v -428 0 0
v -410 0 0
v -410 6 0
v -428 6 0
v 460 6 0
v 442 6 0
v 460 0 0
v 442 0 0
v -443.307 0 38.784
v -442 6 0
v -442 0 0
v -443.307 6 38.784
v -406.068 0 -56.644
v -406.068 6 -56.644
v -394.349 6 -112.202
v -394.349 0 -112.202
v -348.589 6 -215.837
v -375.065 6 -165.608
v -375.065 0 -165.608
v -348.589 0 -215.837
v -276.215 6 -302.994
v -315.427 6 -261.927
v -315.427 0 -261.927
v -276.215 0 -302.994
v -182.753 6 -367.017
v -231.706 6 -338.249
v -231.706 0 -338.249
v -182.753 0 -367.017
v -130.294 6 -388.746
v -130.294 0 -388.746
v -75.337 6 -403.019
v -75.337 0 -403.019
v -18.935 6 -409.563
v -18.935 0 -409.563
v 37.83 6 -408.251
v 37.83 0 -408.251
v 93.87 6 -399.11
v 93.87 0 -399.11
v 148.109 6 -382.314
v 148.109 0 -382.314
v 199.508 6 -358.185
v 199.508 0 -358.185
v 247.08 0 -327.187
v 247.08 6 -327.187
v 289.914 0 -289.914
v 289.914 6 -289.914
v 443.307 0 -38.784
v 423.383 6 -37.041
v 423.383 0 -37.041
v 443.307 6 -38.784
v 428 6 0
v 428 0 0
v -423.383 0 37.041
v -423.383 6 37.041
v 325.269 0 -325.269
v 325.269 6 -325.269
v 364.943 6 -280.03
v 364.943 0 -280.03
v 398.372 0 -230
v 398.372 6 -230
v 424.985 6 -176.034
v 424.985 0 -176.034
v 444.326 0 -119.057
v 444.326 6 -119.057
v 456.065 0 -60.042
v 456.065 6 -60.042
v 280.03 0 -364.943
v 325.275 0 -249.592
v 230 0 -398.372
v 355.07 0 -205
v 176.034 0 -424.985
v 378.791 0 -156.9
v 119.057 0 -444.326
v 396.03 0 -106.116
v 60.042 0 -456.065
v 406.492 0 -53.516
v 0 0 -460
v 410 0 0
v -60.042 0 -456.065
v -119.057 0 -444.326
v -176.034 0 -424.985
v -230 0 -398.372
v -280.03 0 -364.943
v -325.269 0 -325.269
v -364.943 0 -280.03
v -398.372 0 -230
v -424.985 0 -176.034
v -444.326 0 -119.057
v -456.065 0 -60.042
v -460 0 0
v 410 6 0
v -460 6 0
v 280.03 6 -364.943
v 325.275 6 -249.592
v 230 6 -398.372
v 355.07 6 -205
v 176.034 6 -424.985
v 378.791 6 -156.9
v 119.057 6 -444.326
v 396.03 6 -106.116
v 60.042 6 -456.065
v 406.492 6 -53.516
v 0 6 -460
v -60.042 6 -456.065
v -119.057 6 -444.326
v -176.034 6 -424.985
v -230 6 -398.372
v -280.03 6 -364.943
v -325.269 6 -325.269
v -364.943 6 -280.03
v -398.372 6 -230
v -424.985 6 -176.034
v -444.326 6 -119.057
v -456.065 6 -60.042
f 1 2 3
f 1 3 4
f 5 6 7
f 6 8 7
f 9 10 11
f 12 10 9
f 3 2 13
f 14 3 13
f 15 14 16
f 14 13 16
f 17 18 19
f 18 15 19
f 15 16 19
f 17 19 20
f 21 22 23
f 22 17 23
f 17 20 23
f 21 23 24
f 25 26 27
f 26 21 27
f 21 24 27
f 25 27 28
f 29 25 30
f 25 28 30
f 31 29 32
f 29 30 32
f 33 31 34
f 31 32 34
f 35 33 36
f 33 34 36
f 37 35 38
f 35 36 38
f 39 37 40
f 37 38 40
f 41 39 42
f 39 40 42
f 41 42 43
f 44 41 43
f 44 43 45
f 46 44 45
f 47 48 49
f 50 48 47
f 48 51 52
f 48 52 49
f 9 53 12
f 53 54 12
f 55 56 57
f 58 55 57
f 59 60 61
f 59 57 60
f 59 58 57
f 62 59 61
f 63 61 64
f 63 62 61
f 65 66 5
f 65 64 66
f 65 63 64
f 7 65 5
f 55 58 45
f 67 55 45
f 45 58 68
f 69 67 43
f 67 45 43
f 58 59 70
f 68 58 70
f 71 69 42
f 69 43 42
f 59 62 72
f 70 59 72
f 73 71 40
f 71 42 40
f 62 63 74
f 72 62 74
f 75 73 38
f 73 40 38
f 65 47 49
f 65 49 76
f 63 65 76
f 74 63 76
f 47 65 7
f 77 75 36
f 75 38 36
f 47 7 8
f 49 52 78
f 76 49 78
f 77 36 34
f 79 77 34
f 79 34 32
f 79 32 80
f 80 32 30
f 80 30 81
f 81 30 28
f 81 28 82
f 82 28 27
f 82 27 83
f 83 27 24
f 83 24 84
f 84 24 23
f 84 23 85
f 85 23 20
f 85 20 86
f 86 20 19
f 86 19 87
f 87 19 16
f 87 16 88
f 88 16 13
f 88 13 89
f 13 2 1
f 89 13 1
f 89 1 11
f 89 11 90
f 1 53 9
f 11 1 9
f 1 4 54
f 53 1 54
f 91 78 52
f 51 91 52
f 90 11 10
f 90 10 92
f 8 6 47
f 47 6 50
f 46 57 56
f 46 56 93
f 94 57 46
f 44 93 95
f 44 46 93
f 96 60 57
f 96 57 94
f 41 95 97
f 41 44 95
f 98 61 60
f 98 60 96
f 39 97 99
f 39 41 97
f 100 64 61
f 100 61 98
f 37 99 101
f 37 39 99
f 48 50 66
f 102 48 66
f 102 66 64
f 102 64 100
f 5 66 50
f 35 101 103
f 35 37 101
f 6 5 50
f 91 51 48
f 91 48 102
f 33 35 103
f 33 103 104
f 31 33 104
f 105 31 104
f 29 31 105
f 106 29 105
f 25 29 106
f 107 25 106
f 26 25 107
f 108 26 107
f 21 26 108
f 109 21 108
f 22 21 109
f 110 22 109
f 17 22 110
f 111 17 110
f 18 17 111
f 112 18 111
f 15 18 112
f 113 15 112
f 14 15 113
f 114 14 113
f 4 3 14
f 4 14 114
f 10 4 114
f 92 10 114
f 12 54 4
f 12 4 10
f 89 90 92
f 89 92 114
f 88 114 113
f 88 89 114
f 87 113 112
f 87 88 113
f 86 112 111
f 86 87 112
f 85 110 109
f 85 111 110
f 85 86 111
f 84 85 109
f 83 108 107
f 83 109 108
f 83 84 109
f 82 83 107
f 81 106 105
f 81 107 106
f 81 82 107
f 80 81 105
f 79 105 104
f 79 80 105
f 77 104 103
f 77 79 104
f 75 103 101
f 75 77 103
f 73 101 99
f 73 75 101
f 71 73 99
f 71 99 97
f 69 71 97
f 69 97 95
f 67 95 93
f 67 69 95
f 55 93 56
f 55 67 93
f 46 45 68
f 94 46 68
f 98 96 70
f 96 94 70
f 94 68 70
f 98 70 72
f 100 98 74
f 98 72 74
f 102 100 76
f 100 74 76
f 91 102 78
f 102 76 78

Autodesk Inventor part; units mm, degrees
ref_plane "YZ Plane" through (0, 0, 0) normal (1, 0, 0) x (0, 1, 0)
ref_plane "XZ Plane" through (0, 0, 0) normal (0, 1, 0) x (-1, 0, 0)
ref_plane "XY Plane" through (0, 0, 0) normal (0, 0, 1) x (1, 0, 0)
sketch "Esboço1" plane through (0, 0, 0) normal (0, 1, 0) x (-1, 0, 0)
  arc A0 (-410, 0) -> (-289.9138, -289.9138) centre (0, 0) ccw
  arc A1 (-460, 0) -> (-325.2691, -325.2691) centre (0, 0) ccw
  circle A2 centre (0, 0) radius 460
  circle A3 centre (0, 0) radius 410
  line L0 (0, 0) -> (576.9105, 0)
  line L1 (0, 0) -> (-1224.3013, 0) construction
  line L2 (-410, 0) -> (-460, 0)
  point P0 (-460, 0)
  point P1 (-325.2691, -325.2691)
  point P2 (-289.9138, -289.9138)
  point P3 (-325.2691, -325.2691)
  point P4 (460, 0)
  point P5 (410, 0)
  point P6 (-289.9138, -289.9138)
  dimension "d27" = 820
  dimension "d28" = 920
  dimension "d87" = 180
extrude "Extrusão1" add sketch "Esboço1" along normal blind 6 contours A0 A3 L0 A2 A1 L2
sketch "Esboço6" plane through (0, 6, 0) normal (0, 1, 0) x (1, 0, 0)
  arc A0 (460, 0) -> (-460, 0) centre (0, 0) ccw projected
  circle A1 centre (0, 0) radius 460
  arc A2 (410, 0) -> (-410, 0) centre (0, 0) ccw projected
  circle A3 centre (0, 0) radius 410
  line L0 (0, 0) -> (743.005, 65.0045)
  line L1 (410, 0) -> (460, 0) projected
  line L2 (410, 0) -> (428, 0)
  line L3 (428, 0) -> (442, 0)
  line L4 (408.4398, 35.7339) -> (423.3827, 37.0412)
  line L5 (423.3827, 37.0412) -> (443.3066, 38.7843)
  line L6 (428, 0) -> (423.3827, 37.0412)
  line L7 (442, 0) -> (443.3066, 38.7843)
  point P0 (325.2691, 325.2691)
  point P1 (289.9138, 289.9138)
  dimension "d110" = -5
  dimension "d111" = 18
  dimension "d112" = 14
  dimension "d113" = 15
  dimension "d114" = 20
extrude "Extrusão6" cut sketch "Esboço6" against normal up to surface (6 mm away) contours L1 L6 L0 L7
sketch "Esboço8" plane through (0, 6, 0) normal (0, 1, 0) x (1, 0, 0)
  line L0 (0, 0) -> (-648.1086, -56.7022)
  line L1 (-460, 0) -> (-410, 0) projected
  arc A0 (460, 0) -> (-460, 0) centre (0, 0) ccw projected
  line L2 (-460, 0) -> (-442, 0)
  line L3 (-442, 0) -> (-428, 0)
  circle A1 centre (0, 0) radius 460
  circle A2 centre (0, 0) radius 410
  line L4 (-458.2496, -40.0916) -> (-443.3066, -38.7843)
  line L5 (-443.3066, -38.7843) -> (-423.3827, -37.0412)
  line L6 (-442, 0) -> (-443.3066, -38.7843)
  line L7 (-428, 0) -> (-423.3827, -37.0412)
  dimension "d137" = 5
  dimension "d138" = 18
  dimension "d139" = 14
  dimension "d140" = 15
  dimension "d141" = 20
extrude "Extrusão7" add sketch "Esboço8" against normal up to surface (6 mm away) contours L0 L6 L1 L7
equation "\"Raio_vergadura\" = Espessura"
equation "\"Largura_alívio_de_vergadura\" = Espessura"
equation "\"Profundidade_alívio_de_vergadura\" = 0.5 * Espessura"
equation "\"Tamanho_alívio_de_dobra\" = 4 * Espessura"
equation "\"Remanescente_mínimo\" = 2 * Espessura"
equation "\"Raiodetransição\" = Raio_vergadura"
equation "\"Tamanho_de_raio_de_Jacobi\" = Raio_vergadura"
equation "\"TamanhoFolga\" = Espessura"
equation "\"Espessura\" = 3.048"
properties part number "base"
